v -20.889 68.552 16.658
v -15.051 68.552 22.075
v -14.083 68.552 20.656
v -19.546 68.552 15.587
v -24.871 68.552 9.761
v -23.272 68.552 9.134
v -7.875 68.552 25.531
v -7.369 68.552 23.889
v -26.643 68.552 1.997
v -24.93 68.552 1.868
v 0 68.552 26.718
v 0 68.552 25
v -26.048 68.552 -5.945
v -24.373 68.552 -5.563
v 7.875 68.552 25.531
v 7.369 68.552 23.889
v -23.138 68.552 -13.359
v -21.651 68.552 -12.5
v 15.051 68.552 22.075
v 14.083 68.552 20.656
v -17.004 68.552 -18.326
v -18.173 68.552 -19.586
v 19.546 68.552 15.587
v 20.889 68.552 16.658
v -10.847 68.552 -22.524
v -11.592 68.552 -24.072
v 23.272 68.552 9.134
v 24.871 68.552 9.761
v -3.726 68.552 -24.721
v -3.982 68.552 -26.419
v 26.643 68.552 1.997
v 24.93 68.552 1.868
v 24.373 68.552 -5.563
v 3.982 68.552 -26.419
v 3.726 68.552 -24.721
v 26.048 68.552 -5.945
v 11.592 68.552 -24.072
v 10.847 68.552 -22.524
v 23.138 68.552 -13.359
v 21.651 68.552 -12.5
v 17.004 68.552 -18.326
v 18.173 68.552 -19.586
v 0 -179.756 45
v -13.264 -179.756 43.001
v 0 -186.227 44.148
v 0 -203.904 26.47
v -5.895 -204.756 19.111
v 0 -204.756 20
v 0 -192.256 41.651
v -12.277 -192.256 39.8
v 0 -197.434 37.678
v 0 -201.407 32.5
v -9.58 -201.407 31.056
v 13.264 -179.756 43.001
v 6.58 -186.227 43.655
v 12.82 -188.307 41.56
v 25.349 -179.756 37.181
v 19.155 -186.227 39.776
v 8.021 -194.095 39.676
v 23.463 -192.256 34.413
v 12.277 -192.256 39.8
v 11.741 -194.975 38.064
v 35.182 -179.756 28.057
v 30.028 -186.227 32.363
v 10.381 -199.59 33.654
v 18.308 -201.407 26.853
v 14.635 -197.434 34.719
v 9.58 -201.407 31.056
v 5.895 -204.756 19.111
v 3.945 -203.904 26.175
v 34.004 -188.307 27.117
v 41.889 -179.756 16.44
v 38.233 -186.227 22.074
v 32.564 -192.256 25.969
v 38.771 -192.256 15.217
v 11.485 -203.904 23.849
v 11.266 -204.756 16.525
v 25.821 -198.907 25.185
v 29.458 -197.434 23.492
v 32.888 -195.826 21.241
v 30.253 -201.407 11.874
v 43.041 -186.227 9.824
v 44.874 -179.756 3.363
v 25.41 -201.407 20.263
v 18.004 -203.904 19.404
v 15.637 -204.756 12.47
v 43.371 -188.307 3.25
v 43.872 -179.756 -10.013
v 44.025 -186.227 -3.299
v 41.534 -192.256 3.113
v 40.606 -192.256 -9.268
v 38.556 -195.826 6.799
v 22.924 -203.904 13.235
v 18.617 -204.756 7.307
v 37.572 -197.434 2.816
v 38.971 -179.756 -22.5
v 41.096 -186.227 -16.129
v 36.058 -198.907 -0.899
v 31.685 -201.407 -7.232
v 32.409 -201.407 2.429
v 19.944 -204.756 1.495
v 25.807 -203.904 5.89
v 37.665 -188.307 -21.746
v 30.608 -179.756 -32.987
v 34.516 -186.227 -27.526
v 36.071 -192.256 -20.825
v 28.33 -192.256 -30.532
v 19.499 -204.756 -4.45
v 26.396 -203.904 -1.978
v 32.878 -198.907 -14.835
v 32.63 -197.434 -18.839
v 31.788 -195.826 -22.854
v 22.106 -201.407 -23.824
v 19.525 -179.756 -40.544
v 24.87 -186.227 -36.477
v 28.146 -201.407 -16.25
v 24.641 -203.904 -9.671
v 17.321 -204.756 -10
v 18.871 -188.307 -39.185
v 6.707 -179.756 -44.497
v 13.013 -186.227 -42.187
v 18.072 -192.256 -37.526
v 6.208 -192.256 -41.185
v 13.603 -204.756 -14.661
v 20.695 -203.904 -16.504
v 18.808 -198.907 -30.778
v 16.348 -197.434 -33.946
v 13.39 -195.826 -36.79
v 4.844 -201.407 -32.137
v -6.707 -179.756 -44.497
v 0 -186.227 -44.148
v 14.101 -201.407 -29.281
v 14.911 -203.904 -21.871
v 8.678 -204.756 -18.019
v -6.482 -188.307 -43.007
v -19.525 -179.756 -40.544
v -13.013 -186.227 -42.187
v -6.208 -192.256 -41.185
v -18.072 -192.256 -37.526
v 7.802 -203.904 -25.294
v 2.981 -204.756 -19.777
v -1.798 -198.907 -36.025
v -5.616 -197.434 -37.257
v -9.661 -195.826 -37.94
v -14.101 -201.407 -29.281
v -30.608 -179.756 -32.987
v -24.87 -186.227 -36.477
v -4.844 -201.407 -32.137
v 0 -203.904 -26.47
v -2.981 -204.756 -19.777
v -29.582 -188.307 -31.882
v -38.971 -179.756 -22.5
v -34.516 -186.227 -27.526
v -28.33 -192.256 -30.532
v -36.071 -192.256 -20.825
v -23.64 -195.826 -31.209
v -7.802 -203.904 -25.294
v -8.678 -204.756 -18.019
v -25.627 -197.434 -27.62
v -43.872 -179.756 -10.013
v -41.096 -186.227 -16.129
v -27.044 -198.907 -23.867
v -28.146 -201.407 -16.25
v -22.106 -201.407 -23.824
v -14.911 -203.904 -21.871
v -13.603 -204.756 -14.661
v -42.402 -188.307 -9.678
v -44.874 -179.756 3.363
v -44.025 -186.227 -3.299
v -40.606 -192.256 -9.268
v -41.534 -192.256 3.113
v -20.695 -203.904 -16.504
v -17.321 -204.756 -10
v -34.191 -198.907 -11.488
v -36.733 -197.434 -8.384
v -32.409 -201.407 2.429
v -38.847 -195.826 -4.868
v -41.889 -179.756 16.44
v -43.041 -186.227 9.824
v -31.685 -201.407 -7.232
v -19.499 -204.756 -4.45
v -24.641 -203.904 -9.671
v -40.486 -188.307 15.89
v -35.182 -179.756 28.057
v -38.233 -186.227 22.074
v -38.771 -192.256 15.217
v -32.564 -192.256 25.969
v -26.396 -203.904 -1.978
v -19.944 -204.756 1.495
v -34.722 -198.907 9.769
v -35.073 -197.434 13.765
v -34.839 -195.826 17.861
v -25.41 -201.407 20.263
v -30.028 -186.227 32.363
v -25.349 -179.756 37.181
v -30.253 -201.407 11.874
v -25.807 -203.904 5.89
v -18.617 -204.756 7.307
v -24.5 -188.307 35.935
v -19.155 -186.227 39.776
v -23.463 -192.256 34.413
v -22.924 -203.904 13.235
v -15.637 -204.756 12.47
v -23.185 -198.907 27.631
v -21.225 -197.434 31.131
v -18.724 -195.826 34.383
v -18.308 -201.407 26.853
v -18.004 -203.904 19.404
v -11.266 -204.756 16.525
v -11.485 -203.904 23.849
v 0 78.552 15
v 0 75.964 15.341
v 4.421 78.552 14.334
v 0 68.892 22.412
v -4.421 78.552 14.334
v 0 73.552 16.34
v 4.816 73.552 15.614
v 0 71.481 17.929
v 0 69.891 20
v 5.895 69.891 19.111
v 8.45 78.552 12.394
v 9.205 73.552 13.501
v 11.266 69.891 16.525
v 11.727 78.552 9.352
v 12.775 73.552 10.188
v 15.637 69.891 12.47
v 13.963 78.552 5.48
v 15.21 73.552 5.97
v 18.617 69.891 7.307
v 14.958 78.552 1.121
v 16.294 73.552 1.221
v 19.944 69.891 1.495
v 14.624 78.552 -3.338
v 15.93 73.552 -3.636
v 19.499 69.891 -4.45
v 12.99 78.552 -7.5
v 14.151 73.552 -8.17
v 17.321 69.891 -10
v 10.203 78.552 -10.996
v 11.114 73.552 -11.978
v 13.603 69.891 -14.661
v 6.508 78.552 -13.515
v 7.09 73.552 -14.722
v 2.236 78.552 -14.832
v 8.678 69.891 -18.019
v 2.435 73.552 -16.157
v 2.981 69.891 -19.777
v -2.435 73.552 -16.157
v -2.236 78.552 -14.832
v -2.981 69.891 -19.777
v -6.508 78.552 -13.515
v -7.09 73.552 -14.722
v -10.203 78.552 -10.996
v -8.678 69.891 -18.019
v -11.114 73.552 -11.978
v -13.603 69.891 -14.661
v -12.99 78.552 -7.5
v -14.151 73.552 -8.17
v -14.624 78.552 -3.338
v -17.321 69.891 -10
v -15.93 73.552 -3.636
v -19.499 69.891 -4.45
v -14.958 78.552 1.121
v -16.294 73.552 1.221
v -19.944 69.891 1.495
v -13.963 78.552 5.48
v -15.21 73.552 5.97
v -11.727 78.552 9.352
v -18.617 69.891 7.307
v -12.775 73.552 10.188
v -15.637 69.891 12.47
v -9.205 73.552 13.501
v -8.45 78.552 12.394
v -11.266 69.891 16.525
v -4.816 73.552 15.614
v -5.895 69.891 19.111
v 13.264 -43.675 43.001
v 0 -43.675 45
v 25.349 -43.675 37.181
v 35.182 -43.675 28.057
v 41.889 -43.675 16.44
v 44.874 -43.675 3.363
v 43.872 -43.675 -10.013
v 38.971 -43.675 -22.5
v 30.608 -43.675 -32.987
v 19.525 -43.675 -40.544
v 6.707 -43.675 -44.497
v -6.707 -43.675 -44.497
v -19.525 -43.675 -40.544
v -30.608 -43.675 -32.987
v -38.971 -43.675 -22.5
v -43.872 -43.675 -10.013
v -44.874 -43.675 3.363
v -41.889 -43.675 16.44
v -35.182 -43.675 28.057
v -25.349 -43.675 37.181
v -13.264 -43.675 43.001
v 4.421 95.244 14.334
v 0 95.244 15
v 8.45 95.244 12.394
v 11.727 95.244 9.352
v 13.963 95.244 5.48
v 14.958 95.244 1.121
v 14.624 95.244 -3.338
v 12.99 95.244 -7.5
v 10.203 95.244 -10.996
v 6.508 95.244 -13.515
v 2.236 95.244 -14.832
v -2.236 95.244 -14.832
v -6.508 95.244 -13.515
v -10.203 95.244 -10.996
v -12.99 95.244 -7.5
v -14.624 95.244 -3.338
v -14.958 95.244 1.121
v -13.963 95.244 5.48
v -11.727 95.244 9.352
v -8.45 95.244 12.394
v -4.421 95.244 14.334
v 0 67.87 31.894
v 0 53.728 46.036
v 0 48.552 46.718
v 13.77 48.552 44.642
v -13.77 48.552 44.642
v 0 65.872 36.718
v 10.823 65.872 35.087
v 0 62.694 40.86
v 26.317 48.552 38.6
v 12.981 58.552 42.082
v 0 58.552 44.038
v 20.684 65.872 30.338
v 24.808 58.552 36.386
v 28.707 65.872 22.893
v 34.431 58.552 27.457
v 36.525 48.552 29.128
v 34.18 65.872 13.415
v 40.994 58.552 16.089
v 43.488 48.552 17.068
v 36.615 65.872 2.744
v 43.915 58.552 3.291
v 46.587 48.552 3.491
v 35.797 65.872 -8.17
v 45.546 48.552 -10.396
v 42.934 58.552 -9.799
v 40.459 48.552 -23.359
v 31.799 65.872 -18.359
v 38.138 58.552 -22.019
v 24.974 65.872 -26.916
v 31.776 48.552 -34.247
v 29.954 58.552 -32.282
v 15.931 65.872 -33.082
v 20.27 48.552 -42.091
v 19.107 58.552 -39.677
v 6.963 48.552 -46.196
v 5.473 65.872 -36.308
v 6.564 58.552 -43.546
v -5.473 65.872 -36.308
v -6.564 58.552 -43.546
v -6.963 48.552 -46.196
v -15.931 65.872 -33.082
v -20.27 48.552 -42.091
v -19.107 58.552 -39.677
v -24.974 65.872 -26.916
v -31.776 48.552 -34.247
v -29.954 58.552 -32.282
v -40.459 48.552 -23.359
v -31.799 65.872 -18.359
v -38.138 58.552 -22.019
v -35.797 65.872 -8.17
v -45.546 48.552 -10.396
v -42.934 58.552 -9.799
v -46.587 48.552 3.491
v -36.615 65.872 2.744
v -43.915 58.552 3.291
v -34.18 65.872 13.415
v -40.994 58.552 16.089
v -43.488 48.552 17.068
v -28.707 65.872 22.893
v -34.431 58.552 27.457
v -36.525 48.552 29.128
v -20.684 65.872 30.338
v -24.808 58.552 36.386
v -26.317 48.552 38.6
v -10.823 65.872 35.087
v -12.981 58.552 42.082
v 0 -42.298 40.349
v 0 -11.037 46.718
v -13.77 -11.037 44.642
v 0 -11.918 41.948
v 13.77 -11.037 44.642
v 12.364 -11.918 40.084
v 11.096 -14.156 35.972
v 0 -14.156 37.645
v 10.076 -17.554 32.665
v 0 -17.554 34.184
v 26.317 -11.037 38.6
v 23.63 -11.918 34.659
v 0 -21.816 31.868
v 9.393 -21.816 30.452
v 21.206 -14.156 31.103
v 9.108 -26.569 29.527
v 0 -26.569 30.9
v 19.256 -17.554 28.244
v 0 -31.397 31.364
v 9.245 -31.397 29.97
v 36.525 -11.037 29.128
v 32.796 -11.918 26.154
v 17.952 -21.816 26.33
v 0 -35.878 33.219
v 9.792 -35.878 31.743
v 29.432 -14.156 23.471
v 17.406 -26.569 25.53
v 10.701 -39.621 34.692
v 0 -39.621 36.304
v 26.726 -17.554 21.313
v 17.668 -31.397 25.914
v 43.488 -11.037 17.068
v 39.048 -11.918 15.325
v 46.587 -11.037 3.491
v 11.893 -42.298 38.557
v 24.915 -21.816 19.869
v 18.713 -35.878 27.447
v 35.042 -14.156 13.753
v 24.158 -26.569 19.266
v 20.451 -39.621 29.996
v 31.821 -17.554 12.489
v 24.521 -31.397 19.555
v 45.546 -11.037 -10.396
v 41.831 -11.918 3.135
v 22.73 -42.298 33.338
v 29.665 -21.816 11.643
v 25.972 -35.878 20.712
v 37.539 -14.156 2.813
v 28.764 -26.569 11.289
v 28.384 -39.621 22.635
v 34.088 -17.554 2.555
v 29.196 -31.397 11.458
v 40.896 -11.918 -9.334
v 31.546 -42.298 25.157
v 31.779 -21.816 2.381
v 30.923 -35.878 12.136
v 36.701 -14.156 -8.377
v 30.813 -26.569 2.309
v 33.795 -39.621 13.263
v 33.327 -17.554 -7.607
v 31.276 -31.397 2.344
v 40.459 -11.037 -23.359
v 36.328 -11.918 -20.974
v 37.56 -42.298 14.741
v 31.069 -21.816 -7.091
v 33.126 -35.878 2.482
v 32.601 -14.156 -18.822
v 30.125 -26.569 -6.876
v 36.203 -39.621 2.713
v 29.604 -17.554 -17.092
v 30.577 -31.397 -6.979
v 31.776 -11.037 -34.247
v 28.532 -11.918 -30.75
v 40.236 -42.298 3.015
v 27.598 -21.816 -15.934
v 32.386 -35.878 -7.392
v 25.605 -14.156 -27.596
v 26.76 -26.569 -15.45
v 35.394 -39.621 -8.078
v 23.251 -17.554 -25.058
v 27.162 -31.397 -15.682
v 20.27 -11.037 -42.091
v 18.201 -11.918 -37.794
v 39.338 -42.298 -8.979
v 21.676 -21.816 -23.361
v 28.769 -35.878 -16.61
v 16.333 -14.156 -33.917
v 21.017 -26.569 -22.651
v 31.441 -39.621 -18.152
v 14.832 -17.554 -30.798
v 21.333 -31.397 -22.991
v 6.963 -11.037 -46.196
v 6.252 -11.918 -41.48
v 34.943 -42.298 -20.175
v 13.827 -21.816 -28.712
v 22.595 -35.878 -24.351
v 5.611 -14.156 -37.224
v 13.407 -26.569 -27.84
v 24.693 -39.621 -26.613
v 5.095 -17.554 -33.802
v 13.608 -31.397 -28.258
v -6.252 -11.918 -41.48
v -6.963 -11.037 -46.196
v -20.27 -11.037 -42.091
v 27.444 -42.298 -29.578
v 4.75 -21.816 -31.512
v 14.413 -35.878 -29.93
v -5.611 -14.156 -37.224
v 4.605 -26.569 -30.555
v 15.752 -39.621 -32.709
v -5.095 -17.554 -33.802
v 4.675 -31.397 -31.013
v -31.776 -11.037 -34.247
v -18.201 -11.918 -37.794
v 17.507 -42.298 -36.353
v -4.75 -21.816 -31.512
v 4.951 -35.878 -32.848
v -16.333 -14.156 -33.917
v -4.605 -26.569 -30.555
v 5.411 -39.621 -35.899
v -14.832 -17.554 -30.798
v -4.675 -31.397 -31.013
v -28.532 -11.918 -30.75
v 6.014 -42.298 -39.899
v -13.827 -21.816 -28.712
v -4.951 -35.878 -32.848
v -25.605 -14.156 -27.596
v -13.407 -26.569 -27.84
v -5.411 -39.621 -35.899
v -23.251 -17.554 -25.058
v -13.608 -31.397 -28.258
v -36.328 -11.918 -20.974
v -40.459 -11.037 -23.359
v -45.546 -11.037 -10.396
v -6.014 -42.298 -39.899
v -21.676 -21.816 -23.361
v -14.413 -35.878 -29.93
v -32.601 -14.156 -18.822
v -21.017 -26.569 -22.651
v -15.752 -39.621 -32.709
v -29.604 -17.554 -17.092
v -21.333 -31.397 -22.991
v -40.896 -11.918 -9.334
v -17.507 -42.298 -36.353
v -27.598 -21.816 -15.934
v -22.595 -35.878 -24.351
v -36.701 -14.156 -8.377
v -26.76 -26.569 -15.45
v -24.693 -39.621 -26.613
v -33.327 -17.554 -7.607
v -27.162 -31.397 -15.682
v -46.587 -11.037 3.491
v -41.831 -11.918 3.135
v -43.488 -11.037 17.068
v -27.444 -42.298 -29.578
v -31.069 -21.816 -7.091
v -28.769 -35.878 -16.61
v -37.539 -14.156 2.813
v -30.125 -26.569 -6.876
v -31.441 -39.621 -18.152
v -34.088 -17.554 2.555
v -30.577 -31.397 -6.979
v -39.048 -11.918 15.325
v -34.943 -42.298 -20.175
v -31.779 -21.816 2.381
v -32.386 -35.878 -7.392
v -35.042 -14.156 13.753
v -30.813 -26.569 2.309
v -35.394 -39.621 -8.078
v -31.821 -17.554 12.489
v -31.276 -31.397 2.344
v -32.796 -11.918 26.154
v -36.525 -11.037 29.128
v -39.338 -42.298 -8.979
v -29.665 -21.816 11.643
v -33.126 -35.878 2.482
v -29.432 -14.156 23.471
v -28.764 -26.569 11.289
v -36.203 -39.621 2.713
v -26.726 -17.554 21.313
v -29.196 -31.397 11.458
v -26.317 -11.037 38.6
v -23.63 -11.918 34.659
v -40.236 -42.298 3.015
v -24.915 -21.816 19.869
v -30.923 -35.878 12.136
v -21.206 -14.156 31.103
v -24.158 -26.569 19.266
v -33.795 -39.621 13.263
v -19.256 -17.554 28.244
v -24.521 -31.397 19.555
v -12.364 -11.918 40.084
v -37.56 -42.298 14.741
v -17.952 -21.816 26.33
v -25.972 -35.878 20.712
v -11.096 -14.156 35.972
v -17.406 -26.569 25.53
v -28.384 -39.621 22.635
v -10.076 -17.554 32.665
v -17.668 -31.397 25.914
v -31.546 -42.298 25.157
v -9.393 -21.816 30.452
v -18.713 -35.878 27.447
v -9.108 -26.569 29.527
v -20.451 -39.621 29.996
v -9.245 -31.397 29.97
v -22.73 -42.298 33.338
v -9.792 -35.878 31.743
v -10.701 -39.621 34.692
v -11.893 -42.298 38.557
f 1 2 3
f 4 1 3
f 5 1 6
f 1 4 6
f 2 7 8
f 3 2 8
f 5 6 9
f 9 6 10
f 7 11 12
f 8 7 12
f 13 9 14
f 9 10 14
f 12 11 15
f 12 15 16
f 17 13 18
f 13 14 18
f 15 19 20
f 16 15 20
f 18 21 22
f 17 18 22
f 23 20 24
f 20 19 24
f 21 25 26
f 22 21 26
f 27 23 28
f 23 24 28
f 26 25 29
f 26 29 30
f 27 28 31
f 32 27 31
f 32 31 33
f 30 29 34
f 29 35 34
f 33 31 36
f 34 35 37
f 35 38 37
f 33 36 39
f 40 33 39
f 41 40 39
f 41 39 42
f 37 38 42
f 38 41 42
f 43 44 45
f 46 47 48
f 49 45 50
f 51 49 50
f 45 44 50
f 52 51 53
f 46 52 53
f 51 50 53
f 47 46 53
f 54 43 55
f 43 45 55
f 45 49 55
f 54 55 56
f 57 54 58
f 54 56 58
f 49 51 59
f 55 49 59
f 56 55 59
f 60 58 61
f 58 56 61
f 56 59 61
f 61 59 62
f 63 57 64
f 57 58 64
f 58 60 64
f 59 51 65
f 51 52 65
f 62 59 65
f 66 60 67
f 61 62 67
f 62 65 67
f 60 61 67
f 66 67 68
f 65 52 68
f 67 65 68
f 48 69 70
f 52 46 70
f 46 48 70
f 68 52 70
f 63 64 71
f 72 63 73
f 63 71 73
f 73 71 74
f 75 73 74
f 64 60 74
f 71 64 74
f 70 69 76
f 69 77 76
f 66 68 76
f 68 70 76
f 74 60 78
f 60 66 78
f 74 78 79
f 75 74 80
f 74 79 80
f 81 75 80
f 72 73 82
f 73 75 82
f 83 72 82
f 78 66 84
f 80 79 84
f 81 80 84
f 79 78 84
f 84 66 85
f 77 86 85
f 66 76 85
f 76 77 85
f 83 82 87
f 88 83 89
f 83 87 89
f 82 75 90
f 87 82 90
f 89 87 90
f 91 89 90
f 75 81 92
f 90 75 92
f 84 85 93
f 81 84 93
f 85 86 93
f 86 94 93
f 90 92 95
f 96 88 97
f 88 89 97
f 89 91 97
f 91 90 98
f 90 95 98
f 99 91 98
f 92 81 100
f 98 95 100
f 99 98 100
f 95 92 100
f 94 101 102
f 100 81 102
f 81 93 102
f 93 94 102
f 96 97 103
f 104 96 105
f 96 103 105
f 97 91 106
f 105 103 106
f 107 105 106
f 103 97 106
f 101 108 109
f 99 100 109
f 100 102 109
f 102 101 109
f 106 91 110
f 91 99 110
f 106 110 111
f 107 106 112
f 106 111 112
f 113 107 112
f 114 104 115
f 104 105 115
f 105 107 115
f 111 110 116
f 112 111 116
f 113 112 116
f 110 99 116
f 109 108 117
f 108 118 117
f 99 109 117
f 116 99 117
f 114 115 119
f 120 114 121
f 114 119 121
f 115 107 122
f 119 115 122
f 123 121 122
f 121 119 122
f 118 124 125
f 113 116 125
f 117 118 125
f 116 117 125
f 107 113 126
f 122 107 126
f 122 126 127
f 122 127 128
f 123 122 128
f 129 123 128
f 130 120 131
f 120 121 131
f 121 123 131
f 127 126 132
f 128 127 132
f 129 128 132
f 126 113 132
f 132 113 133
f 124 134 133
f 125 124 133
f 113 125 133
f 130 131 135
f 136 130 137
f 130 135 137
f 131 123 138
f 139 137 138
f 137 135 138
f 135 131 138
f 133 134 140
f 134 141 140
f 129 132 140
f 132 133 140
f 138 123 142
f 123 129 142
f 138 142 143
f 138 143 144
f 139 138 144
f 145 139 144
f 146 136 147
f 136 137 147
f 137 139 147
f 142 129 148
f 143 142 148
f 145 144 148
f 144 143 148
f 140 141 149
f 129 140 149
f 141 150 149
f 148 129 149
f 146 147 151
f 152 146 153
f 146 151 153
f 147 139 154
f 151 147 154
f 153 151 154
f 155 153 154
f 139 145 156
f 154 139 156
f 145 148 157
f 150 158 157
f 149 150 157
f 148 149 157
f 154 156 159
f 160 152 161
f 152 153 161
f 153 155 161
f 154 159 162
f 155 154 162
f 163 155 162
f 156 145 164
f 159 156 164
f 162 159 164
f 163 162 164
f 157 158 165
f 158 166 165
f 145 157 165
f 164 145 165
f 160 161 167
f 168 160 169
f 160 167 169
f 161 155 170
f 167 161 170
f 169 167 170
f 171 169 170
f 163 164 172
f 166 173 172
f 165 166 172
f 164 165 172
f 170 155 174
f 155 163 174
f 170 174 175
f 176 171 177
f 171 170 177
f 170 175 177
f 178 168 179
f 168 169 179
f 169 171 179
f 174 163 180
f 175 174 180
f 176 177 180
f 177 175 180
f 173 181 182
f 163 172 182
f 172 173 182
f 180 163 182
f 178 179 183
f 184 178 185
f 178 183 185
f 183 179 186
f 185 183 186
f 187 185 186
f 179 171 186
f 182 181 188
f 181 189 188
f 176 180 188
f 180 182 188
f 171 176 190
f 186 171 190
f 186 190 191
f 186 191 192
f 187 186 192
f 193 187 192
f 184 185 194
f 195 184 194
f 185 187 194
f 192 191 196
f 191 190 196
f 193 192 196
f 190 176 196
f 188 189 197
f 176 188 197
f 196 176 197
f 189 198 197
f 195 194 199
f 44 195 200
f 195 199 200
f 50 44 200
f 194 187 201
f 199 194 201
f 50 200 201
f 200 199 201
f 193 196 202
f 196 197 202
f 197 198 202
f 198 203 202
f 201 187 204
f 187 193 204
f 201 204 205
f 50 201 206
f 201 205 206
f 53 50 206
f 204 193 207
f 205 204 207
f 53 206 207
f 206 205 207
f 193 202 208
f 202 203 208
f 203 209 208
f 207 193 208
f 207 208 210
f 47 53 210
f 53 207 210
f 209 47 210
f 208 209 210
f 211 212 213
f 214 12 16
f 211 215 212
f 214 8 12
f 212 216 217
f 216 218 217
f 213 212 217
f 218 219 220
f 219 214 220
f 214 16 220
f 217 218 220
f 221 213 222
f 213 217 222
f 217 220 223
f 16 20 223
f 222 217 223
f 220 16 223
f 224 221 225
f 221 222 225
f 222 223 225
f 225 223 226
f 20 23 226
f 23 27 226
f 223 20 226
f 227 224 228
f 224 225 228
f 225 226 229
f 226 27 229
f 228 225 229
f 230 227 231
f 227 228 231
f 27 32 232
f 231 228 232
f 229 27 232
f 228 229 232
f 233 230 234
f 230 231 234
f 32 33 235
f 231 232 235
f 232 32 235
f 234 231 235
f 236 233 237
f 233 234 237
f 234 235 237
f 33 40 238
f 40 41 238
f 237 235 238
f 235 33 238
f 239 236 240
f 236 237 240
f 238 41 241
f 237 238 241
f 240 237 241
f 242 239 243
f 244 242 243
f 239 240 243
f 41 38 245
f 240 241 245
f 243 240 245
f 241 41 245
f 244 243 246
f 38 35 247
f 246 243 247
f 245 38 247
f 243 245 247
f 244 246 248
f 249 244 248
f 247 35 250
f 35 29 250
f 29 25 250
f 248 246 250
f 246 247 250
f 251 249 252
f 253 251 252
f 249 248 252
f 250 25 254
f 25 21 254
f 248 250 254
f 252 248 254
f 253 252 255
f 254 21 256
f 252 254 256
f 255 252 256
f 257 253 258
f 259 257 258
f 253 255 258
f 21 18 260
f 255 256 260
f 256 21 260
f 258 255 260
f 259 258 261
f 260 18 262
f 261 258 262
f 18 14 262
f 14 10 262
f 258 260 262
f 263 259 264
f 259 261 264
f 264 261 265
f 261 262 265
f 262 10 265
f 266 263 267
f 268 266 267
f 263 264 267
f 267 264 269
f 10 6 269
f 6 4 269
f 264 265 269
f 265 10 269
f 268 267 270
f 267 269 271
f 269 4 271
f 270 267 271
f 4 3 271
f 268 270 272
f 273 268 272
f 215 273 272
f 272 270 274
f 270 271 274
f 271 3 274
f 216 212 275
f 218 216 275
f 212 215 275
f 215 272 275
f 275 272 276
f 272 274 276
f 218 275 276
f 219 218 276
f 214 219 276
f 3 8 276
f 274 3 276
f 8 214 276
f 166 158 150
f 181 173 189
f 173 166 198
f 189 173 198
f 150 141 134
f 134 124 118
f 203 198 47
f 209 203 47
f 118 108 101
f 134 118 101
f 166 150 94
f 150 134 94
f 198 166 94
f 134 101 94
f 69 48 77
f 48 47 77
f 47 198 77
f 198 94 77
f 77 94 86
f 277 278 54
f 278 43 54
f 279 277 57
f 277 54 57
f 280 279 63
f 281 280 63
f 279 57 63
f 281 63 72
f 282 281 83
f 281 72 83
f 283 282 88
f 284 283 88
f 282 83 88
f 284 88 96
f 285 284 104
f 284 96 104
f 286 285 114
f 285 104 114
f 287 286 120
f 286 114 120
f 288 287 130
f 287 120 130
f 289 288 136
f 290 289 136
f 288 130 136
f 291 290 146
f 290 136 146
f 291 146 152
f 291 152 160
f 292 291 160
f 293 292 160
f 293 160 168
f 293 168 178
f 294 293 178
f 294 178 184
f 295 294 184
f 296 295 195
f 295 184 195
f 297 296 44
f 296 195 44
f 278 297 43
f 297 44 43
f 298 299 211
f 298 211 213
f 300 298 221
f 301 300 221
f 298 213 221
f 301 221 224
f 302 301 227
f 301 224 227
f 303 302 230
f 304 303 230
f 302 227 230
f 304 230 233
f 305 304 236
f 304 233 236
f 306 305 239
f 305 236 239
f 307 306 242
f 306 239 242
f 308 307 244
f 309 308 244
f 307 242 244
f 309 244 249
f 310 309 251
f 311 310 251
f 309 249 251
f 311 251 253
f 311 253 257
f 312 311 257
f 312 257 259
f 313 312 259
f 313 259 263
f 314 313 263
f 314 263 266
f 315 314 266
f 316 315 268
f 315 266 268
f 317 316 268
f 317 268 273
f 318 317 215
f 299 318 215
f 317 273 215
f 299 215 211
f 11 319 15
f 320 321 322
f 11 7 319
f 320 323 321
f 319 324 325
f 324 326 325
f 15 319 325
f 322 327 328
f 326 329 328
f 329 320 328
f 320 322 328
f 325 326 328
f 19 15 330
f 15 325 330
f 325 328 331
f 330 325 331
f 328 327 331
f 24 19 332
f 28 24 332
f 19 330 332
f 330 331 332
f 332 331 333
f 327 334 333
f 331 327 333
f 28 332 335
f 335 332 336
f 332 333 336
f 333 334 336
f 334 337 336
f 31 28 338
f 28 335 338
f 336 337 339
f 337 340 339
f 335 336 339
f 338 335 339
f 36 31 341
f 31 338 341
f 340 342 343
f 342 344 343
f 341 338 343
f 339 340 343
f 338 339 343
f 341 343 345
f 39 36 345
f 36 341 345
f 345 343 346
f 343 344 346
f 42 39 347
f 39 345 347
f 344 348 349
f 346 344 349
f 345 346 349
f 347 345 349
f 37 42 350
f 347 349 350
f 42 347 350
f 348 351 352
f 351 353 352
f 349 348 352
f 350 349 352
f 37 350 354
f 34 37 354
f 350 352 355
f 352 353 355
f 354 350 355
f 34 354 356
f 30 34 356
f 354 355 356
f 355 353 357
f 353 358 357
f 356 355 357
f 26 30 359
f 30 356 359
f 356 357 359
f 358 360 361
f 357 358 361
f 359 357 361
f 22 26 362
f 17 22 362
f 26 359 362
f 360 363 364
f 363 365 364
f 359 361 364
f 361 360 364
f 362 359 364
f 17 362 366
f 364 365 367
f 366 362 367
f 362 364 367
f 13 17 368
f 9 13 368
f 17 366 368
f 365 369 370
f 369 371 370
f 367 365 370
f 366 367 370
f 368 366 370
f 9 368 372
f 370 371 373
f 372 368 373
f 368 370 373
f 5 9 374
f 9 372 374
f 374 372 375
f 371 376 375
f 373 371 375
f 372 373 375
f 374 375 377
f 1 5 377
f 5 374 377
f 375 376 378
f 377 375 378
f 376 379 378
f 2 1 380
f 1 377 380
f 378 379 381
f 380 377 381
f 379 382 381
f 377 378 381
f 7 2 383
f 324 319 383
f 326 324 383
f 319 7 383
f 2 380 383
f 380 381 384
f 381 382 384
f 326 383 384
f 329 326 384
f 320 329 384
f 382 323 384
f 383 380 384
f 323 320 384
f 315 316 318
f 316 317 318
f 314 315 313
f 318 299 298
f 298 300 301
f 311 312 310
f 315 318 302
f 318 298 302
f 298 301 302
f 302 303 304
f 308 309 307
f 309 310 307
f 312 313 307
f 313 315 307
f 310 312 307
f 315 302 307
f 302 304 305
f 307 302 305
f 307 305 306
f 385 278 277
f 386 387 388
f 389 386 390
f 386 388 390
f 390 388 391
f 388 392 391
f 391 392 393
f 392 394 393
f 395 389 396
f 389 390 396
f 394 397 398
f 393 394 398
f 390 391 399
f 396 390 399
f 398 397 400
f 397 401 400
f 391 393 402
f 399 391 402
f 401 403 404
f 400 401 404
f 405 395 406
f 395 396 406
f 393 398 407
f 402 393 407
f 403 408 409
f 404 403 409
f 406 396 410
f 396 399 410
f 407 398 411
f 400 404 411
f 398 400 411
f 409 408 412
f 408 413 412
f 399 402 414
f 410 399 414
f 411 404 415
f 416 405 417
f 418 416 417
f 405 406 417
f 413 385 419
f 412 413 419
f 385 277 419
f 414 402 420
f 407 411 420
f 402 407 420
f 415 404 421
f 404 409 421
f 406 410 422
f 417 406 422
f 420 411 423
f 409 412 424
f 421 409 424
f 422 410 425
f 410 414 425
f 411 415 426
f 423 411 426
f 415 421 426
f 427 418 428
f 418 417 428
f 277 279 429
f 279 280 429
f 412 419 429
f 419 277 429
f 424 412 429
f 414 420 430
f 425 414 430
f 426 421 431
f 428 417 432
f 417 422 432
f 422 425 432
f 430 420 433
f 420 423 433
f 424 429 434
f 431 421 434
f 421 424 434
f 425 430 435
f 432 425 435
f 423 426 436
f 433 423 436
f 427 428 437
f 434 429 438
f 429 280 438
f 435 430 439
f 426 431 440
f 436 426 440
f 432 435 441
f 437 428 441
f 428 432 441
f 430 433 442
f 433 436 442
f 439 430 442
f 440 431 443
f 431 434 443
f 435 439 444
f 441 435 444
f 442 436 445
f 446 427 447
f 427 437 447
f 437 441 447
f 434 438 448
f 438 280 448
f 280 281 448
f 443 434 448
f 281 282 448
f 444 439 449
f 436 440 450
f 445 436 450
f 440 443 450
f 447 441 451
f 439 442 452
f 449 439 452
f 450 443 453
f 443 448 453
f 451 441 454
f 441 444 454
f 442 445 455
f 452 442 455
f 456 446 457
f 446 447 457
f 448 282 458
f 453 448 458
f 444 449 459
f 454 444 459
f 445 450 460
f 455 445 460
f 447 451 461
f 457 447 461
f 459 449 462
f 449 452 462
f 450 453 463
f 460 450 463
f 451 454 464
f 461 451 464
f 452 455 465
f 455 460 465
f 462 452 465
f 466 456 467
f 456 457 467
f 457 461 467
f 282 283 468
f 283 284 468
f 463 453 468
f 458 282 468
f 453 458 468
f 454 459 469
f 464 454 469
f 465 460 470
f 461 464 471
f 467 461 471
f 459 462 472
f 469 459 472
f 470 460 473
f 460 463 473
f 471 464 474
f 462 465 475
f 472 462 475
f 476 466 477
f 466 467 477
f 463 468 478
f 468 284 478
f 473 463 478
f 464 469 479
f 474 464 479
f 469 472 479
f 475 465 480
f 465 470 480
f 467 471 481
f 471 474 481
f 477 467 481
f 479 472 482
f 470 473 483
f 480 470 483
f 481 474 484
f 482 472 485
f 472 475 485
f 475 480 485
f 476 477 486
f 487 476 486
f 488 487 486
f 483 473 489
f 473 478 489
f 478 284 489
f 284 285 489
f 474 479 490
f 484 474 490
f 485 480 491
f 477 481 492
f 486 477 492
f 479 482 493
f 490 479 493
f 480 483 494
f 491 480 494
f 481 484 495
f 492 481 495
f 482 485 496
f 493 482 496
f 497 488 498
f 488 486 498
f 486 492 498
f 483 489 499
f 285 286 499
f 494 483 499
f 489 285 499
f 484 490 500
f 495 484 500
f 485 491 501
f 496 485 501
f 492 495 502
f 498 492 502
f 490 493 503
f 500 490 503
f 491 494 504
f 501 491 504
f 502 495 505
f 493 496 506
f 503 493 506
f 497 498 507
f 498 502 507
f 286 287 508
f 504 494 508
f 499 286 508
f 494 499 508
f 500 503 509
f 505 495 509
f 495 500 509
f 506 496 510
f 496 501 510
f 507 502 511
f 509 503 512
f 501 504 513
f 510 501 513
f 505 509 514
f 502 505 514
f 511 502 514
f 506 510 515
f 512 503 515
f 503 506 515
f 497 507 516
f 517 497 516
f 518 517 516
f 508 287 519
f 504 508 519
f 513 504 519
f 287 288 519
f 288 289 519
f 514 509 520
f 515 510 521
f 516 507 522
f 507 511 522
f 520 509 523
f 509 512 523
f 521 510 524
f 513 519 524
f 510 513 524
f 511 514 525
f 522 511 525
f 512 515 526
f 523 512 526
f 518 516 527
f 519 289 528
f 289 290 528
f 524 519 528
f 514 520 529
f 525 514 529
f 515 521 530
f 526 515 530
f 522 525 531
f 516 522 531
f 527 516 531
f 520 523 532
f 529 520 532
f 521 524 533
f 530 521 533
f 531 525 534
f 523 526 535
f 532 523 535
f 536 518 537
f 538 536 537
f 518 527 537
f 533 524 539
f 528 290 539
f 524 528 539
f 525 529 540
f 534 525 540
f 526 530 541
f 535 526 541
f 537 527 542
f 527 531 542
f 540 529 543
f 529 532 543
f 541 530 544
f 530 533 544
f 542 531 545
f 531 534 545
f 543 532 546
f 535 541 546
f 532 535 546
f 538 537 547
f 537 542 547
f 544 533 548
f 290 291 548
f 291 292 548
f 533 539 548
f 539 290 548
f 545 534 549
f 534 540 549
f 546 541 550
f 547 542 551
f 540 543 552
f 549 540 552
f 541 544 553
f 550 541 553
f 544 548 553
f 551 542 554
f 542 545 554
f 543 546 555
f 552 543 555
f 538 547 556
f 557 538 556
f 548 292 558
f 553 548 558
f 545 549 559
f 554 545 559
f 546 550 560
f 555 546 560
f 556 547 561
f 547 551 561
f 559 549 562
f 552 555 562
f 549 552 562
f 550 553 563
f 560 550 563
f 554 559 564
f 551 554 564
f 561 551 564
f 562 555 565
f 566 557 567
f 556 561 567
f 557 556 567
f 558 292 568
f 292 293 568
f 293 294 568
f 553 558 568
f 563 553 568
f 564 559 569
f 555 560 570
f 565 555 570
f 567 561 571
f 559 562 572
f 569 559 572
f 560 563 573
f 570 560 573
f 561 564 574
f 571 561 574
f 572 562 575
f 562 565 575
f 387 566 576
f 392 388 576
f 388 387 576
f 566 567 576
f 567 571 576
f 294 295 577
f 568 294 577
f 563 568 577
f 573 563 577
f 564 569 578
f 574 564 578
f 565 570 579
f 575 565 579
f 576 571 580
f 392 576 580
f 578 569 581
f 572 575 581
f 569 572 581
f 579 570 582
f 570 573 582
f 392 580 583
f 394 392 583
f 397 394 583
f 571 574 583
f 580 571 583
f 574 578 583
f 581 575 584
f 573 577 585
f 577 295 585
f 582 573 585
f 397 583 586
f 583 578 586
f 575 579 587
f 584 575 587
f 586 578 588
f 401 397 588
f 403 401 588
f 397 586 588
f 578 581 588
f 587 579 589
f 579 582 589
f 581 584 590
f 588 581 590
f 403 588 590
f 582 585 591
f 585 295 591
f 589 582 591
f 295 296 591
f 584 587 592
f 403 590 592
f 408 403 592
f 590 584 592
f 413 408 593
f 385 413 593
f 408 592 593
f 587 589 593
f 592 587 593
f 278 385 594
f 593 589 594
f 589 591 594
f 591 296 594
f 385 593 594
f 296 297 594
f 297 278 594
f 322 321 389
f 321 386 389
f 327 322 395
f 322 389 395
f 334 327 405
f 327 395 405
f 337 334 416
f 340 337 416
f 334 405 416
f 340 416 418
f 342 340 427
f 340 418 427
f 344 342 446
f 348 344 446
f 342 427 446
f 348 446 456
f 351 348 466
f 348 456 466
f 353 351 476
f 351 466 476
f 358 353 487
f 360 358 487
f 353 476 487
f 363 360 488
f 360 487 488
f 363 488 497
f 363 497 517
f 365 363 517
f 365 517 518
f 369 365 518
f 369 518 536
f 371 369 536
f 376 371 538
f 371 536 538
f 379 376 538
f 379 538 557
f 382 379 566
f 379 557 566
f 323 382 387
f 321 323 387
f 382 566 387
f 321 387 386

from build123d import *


with BuildPart() as f1:
    # F0 (on Right) → F1 (revolve)
    with BuildSketch(Plane.YZ):
        with BuildLine():
            Line((-204.756087, 20), (-204.756087, 0))
            Line((-204.756087, 0), (95.243913, 0))
            Line((95.243913, 0), (95.243913, 15))
            Line((95.243913, 15), (78.551713, 15))
            ThreePointArc((78.551713, 15), (71.480645, 17.928932), (68.551713, 25))
            Line((68.551713, 25), (68.551713, 26.717782))
            ThreePointArc((68.551713, 26.717782), (62.693848, 40.859917), (48.551713, 46.717782))
            Line((48.551713, 46.717782), (-11.037248, 46.717782))
            ThreePointArc((-11.037248, 46.717782), (-26.568814, 30.899643), (-43.675041, 45))
            Line((-43.675041, 45), (-179.756087, 45))
            ThreePointArc((-179.756087, 45), (-197.433757, 37.67767), (-204.756087, 20))
        make_face()
    revolve(axis=Axis((0, -4.756087, 0), (0, 1, 0)))


solid = f1.part
